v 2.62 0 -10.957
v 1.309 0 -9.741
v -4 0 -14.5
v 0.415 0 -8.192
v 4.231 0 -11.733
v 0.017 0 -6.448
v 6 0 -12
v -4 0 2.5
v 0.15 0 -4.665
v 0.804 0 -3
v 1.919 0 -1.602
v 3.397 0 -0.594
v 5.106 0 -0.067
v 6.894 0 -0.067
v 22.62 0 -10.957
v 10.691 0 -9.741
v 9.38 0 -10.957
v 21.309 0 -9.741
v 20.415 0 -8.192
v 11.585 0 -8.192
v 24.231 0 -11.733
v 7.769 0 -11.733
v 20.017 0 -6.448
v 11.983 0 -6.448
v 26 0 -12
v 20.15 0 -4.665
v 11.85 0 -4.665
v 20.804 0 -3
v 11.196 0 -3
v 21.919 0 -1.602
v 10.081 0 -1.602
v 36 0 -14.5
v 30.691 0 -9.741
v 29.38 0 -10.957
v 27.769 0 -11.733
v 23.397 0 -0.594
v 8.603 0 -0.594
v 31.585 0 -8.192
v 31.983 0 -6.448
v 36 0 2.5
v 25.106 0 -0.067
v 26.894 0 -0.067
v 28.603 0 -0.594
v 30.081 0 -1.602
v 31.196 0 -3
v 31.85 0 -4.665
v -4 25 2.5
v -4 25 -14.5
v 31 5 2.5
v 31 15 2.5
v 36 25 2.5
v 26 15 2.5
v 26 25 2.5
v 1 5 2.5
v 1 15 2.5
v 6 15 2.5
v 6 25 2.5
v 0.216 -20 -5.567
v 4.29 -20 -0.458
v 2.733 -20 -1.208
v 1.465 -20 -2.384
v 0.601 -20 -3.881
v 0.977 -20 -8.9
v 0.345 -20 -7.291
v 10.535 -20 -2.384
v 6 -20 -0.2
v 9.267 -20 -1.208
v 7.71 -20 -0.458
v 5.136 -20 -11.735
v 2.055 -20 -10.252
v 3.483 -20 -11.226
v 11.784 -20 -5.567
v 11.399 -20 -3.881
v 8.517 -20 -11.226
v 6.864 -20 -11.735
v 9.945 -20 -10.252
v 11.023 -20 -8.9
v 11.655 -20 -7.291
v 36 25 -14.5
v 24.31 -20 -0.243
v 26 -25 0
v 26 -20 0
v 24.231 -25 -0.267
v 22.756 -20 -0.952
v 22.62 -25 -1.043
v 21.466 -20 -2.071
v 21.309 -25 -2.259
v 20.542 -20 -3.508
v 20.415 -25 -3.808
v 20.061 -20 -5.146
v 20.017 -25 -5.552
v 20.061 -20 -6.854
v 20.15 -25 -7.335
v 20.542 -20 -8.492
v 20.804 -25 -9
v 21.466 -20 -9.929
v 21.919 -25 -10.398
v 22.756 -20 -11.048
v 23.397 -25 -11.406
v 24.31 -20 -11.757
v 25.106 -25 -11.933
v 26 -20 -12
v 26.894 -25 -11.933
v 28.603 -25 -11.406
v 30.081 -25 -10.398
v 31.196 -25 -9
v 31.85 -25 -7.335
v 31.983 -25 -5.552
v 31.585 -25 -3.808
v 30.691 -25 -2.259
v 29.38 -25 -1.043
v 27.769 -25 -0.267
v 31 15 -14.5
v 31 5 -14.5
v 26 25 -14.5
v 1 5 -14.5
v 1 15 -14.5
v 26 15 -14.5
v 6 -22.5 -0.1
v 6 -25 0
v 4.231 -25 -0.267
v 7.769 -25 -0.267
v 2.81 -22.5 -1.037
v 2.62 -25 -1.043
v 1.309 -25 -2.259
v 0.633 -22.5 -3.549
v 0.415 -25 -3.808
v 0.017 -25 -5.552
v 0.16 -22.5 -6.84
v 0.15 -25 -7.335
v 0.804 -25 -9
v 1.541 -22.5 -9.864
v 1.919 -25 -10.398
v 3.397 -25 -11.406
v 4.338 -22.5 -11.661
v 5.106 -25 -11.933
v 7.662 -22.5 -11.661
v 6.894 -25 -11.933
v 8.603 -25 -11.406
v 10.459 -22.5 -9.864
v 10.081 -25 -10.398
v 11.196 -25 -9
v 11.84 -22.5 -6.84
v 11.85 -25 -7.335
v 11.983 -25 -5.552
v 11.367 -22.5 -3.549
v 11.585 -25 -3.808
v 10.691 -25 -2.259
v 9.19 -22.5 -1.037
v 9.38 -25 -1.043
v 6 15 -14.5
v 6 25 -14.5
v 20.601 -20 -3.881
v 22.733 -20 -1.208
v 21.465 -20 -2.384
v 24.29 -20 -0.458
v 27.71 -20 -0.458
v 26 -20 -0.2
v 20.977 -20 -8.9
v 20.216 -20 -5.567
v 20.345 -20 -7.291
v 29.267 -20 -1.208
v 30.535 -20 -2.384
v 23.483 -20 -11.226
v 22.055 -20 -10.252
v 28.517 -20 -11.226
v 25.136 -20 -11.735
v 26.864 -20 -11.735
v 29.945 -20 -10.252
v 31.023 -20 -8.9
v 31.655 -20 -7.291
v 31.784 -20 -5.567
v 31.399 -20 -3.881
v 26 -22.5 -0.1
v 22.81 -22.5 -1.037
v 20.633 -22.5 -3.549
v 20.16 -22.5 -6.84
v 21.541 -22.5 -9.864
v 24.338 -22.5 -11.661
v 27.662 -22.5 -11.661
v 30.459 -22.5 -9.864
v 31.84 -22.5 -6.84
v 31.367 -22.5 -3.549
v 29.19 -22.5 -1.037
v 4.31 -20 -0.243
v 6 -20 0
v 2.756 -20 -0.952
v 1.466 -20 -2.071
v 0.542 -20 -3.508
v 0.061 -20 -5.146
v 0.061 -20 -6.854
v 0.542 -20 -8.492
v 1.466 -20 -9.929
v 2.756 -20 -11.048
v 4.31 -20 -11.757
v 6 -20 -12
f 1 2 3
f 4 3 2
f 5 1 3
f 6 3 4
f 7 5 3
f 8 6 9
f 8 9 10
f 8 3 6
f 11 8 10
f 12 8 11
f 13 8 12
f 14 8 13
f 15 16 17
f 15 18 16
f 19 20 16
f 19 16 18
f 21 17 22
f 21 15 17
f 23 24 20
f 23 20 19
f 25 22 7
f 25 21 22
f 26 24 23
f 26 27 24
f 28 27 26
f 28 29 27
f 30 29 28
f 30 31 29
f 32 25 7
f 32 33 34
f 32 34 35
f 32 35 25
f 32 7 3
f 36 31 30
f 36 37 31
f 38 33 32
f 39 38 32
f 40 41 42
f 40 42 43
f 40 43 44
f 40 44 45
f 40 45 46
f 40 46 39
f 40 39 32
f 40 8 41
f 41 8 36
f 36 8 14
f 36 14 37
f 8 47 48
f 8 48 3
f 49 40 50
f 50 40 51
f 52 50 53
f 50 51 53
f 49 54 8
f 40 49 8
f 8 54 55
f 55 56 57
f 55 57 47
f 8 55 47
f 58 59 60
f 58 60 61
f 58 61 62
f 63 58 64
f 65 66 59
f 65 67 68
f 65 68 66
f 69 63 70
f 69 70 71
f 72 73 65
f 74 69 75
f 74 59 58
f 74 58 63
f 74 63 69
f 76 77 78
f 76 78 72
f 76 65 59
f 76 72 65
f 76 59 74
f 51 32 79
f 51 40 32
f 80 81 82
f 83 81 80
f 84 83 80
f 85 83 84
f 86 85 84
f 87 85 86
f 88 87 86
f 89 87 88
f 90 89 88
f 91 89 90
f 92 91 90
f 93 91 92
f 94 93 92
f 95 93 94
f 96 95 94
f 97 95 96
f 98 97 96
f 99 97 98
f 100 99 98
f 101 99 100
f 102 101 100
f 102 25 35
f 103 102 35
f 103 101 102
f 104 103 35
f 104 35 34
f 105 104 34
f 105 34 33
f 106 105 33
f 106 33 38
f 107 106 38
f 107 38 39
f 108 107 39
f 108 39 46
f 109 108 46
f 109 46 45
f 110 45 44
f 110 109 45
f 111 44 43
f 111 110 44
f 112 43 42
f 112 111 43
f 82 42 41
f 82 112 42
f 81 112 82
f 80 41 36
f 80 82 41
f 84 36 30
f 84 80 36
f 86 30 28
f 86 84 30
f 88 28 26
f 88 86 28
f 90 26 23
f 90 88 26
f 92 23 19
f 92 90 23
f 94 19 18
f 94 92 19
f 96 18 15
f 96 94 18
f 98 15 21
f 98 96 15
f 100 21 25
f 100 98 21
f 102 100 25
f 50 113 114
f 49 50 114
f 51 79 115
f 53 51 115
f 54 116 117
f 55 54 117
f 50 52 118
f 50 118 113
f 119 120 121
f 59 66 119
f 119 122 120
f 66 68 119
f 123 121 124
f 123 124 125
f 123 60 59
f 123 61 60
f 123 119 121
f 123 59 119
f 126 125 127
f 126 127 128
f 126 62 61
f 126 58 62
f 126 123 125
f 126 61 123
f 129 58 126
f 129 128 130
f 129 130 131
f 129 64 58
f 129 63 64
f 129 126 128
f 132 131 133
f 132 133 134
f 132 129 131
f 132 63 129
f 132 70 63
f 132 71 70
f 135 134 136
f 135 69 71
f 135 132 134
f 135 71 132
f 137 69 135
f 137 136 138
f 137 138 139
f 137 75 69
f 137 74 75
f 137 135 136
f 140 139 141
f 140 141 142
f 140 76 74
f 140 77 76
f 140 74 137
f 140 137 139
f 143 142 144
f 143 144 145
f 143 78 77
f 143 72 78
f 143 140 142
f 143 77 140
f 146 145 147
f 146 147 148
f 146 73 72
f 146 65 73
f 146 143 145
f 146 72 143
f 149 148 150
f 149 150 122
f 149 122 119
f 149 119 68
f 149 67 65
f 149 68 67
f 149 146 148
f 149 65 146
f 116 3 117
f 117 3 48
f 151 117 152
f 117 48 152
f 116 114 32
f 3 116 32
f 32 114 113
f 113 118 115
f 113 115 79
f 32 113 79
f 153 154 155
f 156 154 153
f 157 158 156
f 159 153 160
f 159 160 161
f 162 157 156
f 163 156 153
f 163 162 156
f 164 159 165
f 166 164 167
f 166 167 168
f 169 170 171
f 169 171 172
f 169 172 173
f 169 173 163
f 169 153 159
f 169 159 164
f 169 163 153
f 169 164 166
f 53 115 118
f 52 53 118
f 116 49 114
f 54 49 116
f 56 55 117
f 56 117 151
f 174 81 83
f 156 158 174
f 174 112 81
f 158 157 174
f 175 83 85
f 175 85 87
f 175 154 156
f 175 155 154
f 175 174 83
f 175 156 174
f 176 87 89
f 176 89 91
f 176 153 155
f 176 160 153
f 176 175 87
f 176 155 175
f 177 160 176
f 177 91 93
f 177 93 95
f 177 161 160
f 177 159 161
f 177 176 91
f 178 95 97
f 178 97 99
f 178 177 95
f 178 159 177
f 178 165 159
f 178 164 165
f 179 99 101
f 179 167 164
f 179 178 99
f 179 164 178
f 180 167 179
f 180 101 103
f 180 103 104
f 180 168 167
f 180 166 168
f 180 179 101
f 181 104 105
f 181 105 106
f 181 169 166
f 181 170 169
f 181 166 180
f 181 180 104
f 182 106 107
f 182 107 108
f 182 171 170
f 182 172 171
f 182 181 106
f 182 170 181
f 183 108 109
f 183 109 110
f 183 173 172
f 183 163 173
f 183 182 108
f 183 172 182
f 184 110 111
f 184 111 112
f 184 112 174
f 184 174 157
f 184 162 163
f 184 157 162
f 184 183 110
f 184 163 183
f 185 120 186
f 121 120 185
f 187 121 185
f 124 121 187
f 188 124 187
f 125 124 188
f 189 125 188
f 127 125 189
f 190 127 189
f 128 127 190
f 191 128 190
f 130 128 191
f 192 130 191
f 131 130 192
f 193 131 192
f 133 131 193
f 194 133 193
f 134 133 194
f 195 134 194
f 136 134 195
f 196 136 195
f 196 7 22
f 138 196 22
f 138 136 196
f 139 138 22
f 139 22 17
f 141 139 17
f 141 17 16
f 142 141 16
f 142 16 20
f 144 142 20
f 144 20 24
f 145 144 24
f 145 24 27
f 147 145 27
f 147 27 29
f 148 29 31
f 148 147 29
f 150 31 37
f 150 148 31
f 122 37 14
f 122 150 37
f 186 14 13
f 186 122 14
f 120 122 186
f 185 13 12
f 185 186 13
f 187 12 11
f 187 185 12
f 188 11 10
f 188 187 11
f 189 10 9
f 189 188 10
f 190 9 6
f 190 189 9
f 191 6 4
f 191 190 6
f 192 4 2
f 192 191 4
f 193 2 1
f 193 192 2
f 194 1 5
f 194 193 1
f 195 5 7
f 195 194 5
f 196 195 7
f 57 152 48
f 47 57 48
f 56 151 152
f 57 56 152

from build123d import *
from build123d.topology import SkipClean

# Parameters (mm, degrees)
SKETCH_3_W          = 32
SKETCH_3_H          = 12
EXTRUDE_3_DEPTH     = 5
SKETCH_4_R          = 5
EXTRUDE_4_DEPTH     = 10
SKETCH_8_R          = 5
EXTRUDE_6_DEPTH     = 5
SKETCH_9_R          = 4.8
CUT_EXTRUDE_2_DEPTH = 0.5
EXTRUDE_START       = 5
SKETCH_36_R         = 5
SKETCH_36_R_2       = 4.98
EXTRUDE_11_DEPTH    = 5
SKETCH_46_W         = 32
SKETCH_46_H         = 12
EXTRUDE_12_DEPTH    = 20
SKETCH_47_W         = 4
SKETCH_47_H         = 25
EXTRUDE_13_DEPTH    = 12
SKETCH_48_W         = 4
SKETCH_48_H         = 25
EXTRUDE_14_DEPTH    = 12
CUT_EXTRUDE_START   = -12
CUT_EXTRUDE_5_DEPTH = 12
SKETCH_50_R         = 6
EXTRUDE_15_DEPTH    = 20
SKETCH_51_R         = 6
EXTRUDE_16_DEPTH    = 20
EXTRUDE_17_DEPTH    = 2.5
EXTRUDE_18_DEPTH    = 2.5


# Read off the part's stored shape, not the designer's step: the extrude step
with BuildPart() as part:
    # 草图3 → 凸台-拉伸3 (new body)
    with BuildSketch(Plane(origin=(0, 0, 0), x_dir=(1, 0, 0), z_dir=(0, 1, 0))):
        with Locations((16, 6)):
            Rectangle(SKETCH_3_W, SKETCH_3_H)
    extrude(amount=EXTRUDE_3_DEPTH)

    # 草图4 → 凸台-拉伸4 (add)
    with BuildSketch(Plane.XZ):
        with Locations(Location((6, -6, 0), (0, 0, 270))):
            Circle(SKETCH_4_R)
        with Locations(Location((26, -6, 0), (0, 0, 270))):
            Circle(SKETCH_4_R)
    extrude(amount=EXTRUDE_4_DEPTH)

    # 草图8 → 凸台-拉伸6 (add)
    with BuildSketch(Plane.XZ.offset(10)):
        with Locations(Location((6, -6, 0), (0, 0, 270))):
            Circle(SKETCH_8_R)
    extrude(amount=EXTRUDE_6_DEPTH)

    # 草图9 → 切除-拉伸2 (cut)
    with BuildSketch(Plane.XZ.offset(15)):
        with Locations(Location((6, -6, 0), (0, 0, 270))):
            Circle(SKETCH_9_R)
    extrude(amount=-CUT_EXTRUDE_2_DEPTH, mode=Mode.SUBTRACT)



with BuildPart() as body_2:
    # 草图14 → 旋转2 (revolve)
    with BuildSketch(Plane.XY.offset(-6), mode=Mode.PRIVATE) as revolve_2_sk:
        Polygon((1.021282046, -15), (1.021282046, -20), (1.221282046, -15), align=None)
    revolve(revolve_2_sk.sketch.rotate(Axis((6, -15, -6), (0, 1, 0)), 270), axis=Axis((6, -15, -6), (0, 1, 0)))


with BuildPart() as part_1:
    with SkipClean():  # the faces are left unmerged after this step: merging them gives an invalid solid
        add(part.part)

        add(body_2.part)  # 凸台-拉伸11 merges body 2
        # 草图36 → 凸台-拉伸11 (add)
        with BuildSketch(Plane(origin=(0, -20, 0), x_dir=(1, 0, 0), z_dir=(0, 1, 0)).offset(EXTRUDE_START)):
            with Locations(Location((6, 6, 0), (0, 0, 270))):
                Circle(SKETCH_36_R)
            with Locations(Location((6, 6, 0), (0, 0, 90))):
                Circle(SKETCH_36_R_2, mode=Mode.SUBTRACT)
        extrude(amount=-EXTRUDE_11_DEPTH)

    # 草图46 → 凸台-拉伸12 (add)
    with SkipClean():  # the faces are left unmerged after this step: merging them gives an invalid solid
        with BuildSketch(Plane(origin=(0, 5, 0), x_dir=(1, 0, 0), z_dir=(0, 1, 0))):
            with Locations((16, 6)):
                Rectangle(SKETCH_46_W, SKETCH_46_H)
        extrude(amount=EXTRUDE_12_DEPTH)

    # 草图47 → 凸台-拉伸13 (add)
    with SkipClean():  # the faces are left unmerged after this step: merging them gives an invalid solid
        with BuildSketch(Plane.XY):
            with Locations((-2, 12.5)):
                Rectangle(SKETCH_47_W, SKETCH_47_H)
        extrude(amount=-EXTRUDE_13_DEPTH)

    # 草图48 → 凸台-拉伸14 (add)
    with SkipClean():  # the faces are left unmerged after this step: merging them gives an invalid solid
        with BuildSketch(Plane.XY):
            with Locations((34, 12.5)):
                Rectangle(SKETCH_48_W, SKETCH_48_H)
        extrude(amount=-EXTRUDE_14_DEPTH)

    # 切除-拉伸5 outline → 切除-拉伸5 (cut)
    with SkipClean():  # the faces are left unmerged after this step: merging them gives an invalid solid
        with BuildSketch(Plane.XY.offset(CUT_EXTRUDE_START)):
            Polygon((26, 25), (6, 25), (6, 15), (1, 15), (1, 5), (31, 5), (31, 15), (26, 15), align=None)
        extrude(amount=CUT_EXTRUDE_5_DEPTH, mode=Mode.SUBTRACT)

    # 草图50 → 凸台-拉伸15 (add)
    with BuildSketch(Plane.XZ):
        with Locations(Location((6, -6, 0), (0, 0, 270))):
            Circle(SKETCH_50_R)
    extrude(amount=EXTRUDE_15_DEPTH)

    # 草图51 → 凸台-拉伸16 (add)
    with BuildSketch(Plane.XZ):
        with Locations(Location((26, -6, 0), (0, 0, 270))):
            Circle(SKETCH_51_R)
    extrude(amount=EXTRUDE_16_DEPTH)

    # 草图52 → 旋转3 (revolve)
    with BuildSketch(Plane.XY.offset(-6), mode=Mode.PRIVATE) as revolve_3_sk:
        Polygon((0, -20), (0, -25), (0.2, -20), align=None)
    revolve(revolve_3_sk.sketch.rotate(Axis((6, -20, -6), (0, -1, 0)), 270), axis=Axis((6, -20, -6), (0, -1, 0)))

    # 草图53 → 旋转4 (revolve)
    with BuildSketch(Plane.XY.offset(-6), mode=Mode.PRIVATE) as revolve_4_sk:
        Polygon((20, -20), (20, -25), (20.2, -20), align=None)
    revolve(revolve_4_sk.sketch.rotate(Axis((26, -20, -6), (0, -1, 0)), 270), axis=Axis((26, -20, -6), (0, -1, 0)))

    # 草图55 → 凸台-拉伸17 (add)
    with BuildSketch(Plane.XY):
        Polygon((-4, 25), (6, 25), (6, 15), (1, 15), (1, 5), (31, 5), (31, 15), (26, 15), (26, 25), (36, 25), (36, 0), (-4, 0), align=None)
    extrude(amount=EXTRUDE_17_DEPTH)

    # 草图56 → 凸台-拉伸18 (add)
    with BuildSketch(Plane(origin=(0, 0, -12), x_dir=(-1, 0, 0), z_dir=(0, 0, -1))):
        Polygon((-36, 25), (-26, 25), (-26, 15), (-31, 15), (-31, 5), (-1, 5), (-1, 15), (-6, 15), (-6, 25), (4, 25), (4, 0), (-36, 0), align=None)
    extrude(amount=EXTRUDE_18_DEPTH)


solid = part_1.part
